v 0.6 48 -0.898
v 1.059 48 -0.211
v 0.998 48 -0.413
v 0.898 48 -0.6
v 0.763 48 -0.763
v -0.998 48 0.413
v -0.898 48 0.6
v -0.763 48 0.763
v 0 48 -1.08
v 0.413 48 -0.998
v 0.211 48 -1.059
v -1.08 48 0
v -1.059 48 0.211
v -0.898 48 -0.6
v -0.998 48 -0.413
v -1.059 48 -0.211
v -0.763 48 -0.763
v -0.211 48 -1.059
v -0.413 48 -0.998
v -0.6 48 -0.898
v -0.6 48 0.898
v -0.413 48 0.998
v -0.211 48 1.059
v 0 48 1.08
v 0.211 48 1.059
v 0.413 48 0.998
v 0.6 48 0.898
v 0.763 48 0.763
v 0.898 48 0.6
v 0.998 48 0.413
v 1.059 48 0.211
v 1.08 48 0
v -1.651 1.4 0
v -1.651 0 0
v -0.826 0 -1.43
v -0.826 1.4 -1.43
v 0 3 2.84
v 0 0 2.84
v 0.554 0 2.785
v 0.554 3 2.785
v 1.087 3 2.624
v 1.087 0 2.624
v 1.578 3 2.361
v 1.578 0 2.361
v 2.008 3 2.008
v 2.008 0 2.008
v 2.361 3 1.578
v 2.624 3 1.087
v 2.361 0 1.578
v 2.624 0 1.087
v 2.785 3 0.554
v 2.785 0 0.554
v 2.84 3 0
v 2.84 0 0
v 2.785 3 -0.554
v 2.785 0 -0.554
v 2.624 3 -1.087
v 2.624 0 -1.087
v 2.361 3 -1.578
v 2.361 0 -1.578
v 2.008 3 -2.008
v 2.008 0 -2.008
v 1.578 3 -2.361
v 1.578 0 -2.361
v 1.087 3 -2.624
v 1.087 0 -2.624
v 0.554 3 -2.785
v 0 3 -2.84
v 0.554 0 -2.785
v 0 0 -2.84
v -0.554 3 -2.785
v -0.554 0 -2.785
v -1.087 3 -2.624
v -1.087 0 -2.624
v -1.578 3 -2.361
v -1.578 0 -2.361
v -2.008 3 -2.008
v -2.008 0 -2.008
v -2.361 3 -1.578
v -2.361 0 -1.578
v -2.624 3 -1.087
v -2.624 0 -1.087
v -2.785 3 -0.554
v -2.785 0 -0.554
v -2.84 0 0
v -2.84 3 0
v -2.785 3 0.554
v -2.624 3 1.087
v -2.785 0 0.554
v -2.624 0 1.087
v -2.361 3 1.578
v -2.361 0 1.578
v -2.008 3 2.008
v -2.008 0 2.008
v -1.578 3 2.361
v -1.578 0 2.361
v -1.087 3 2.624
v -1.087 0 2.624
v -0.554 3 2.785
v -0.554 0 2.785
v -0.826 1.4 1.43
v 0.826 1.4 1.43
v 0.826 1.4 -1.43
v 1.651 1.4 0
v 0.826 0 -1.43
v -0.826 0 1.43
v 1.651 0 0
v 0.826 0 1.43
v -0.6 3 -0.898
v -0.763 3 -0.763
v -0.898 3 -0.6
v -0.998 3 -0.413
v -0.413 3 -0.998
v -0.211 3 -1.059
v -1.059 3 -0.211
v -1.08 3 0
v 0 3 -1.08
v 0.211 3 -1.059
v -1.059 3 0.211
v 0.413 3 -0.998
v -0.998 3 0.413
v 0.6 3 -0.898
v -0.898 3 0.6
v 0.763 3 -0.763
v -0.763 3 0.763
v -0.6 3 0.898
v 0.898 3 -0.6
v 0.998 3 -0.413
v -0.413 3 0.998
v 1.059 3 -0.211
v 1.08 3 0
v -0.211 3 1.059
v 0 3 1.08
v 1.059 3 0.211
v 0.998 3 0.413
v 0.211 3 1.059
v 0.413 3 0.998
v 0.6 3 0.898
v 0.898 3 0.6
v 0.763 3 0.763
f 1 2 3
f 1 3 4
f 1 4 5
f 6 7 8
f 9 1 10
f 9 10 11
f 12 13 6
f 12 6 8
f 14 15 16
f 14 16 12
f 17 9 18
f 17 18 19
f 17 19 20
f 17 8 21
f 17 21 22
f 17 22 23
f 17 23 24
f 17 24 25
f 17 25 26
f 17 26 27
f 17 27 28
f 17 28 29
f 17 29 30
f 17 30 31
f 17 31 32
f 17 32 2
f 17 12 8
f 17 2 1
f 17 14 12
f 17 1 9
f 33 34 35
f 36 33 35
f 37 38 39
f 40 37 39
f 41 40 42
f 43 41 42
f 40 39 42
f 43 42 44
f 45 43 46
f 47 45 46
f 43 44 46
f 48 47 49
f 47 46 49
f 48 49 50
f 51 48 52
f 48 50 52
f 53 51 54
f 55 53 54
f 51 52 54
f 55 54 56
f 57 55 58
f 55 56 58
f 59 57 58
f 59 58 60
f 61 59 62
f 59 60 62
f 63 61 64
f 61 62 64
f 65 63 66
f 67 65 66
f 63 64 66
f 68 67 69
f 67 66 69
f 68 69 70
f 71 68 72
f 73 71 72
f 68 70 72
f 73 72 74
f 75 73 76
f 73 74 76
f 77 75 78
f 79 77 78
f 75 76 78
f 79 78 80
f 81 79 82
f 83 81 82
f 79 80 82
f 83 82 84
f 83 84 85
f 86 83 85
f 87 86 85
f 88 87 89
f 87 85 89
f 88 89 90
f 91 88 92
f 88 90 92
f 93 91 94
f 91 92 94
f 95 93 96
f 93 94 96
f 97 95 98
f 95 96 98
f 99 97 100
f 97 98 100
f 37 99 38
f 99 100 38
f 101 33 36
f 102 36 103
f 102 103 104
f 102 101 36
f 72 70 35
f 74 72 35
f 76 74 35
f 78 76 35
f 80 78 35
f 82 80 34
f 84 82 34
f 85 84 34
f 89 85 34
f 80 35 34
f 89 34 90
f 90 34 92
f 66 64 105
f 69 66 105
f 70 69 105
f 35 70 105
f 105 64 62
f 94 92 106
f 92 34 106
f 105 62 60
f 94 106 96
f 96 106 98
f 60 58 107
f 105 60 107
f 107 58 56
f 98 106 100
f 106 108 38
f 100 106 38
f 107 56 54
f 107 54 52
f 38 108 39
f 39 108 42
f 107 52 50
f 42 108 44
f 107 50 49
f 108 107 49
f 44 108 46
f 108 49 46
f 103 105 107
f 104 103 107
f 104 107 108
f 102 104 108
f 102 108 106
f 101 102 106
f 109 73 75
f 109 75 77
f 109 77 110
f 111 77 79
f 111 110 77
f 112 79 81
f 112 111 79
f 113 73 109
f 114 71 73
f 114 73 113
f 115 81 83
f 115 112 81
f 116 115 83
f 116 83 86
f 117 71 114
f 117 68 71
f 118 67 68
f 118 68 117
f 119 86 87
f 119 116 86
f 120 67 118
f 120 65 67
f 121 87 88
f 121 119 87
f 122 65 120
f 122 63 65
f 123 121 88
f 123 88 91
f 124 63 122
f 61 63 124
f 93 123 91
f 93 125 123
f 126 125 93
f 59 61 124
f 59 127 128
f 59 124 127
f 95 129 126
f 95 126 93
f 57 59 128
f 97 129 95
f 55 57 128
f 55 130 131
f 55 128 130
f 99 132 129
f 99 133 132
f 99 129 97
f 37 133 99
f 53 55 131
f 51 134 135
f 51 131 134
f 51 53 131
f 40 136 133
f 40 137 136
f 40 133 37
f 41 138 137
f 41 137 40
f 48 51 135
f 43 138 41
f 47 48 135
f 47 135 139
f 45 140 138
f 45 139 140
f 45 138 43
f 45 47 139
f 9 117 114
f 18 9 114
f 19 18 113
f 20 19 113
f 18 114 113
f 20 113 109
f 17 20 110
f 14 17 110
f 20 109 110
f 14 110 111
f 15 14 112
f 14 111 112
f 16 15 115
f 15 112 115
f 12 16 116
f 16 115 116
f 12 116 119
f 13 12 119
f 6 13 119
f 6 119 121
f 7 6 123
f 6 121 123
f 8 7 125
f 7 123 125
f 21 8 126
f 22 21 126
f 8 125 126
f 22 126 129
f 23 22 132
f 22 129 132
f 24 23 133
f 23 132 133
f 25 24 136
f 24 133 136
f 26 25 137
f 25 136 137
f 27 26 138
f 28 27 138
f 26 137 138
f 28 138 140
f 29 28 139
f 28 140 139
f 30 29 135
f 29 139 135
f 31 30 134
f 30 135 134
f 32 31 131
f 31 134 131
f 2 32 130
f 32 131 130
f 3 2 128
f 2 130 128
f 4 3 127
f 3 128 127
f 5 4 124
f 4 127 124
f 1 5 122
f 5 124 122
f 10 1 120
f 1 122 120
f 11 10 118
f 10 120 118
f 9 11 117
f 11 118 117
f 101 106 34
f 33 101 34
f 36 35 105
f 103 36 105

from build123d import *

# Parameters (mm, degrees)
SKETCH1_R           = 2.84
BOSS_EXTRUDE1_DEPTH = 3
SKETCH2_R           = 1.079696648
BOSS_EXTRUDE2_DEPTH = 45
CUT_EXTRUDE1_DEPTH  = 1.4


with BuildPart() as part:
    # Sketch1 → Boss-Extrude1 (new body)
    with BuildSketch(Plane(origin=(0, 0, 0), x_dir=(1, 0, 0), z_dir=(0, 1, 0))):
        with Locations(Location((0, 0, 0), (0, 0, 270))):
            Circle(SKETCH1_R)
    extrude(amount=BOSS_EXTRUDE1_DEPTH)

    # Sketch2 → Boss-Extrude2 (add)
    with BuildSketch(Plane(origin=(0, 3, 0), x_dir=(1, 0, 0), z_dir=(0, 1, 0))):
        with Locations(Location((0, 0, 0), (0, 0, 90))):
            Circle(SKETCH2_R)
    extrude(amount=BOSS_EXTRUDE2_DEPTH)

    # Sketch3 → Cut-Extrude1 (cut)
    with BuildSketch(Plane.XZ):
        Polygon((1.65122177, 0), (0.825610885, 1.43), (-0.825610885, 1.43), (-1.65122177, 0), (-0.825610885, -1.43), (0.825610885, -1.43), align=None)
    extrude(amount=-CUT_EXTRUDE1_DEPTH, mode=Mode.SUBTRACT)


solid = part.part
